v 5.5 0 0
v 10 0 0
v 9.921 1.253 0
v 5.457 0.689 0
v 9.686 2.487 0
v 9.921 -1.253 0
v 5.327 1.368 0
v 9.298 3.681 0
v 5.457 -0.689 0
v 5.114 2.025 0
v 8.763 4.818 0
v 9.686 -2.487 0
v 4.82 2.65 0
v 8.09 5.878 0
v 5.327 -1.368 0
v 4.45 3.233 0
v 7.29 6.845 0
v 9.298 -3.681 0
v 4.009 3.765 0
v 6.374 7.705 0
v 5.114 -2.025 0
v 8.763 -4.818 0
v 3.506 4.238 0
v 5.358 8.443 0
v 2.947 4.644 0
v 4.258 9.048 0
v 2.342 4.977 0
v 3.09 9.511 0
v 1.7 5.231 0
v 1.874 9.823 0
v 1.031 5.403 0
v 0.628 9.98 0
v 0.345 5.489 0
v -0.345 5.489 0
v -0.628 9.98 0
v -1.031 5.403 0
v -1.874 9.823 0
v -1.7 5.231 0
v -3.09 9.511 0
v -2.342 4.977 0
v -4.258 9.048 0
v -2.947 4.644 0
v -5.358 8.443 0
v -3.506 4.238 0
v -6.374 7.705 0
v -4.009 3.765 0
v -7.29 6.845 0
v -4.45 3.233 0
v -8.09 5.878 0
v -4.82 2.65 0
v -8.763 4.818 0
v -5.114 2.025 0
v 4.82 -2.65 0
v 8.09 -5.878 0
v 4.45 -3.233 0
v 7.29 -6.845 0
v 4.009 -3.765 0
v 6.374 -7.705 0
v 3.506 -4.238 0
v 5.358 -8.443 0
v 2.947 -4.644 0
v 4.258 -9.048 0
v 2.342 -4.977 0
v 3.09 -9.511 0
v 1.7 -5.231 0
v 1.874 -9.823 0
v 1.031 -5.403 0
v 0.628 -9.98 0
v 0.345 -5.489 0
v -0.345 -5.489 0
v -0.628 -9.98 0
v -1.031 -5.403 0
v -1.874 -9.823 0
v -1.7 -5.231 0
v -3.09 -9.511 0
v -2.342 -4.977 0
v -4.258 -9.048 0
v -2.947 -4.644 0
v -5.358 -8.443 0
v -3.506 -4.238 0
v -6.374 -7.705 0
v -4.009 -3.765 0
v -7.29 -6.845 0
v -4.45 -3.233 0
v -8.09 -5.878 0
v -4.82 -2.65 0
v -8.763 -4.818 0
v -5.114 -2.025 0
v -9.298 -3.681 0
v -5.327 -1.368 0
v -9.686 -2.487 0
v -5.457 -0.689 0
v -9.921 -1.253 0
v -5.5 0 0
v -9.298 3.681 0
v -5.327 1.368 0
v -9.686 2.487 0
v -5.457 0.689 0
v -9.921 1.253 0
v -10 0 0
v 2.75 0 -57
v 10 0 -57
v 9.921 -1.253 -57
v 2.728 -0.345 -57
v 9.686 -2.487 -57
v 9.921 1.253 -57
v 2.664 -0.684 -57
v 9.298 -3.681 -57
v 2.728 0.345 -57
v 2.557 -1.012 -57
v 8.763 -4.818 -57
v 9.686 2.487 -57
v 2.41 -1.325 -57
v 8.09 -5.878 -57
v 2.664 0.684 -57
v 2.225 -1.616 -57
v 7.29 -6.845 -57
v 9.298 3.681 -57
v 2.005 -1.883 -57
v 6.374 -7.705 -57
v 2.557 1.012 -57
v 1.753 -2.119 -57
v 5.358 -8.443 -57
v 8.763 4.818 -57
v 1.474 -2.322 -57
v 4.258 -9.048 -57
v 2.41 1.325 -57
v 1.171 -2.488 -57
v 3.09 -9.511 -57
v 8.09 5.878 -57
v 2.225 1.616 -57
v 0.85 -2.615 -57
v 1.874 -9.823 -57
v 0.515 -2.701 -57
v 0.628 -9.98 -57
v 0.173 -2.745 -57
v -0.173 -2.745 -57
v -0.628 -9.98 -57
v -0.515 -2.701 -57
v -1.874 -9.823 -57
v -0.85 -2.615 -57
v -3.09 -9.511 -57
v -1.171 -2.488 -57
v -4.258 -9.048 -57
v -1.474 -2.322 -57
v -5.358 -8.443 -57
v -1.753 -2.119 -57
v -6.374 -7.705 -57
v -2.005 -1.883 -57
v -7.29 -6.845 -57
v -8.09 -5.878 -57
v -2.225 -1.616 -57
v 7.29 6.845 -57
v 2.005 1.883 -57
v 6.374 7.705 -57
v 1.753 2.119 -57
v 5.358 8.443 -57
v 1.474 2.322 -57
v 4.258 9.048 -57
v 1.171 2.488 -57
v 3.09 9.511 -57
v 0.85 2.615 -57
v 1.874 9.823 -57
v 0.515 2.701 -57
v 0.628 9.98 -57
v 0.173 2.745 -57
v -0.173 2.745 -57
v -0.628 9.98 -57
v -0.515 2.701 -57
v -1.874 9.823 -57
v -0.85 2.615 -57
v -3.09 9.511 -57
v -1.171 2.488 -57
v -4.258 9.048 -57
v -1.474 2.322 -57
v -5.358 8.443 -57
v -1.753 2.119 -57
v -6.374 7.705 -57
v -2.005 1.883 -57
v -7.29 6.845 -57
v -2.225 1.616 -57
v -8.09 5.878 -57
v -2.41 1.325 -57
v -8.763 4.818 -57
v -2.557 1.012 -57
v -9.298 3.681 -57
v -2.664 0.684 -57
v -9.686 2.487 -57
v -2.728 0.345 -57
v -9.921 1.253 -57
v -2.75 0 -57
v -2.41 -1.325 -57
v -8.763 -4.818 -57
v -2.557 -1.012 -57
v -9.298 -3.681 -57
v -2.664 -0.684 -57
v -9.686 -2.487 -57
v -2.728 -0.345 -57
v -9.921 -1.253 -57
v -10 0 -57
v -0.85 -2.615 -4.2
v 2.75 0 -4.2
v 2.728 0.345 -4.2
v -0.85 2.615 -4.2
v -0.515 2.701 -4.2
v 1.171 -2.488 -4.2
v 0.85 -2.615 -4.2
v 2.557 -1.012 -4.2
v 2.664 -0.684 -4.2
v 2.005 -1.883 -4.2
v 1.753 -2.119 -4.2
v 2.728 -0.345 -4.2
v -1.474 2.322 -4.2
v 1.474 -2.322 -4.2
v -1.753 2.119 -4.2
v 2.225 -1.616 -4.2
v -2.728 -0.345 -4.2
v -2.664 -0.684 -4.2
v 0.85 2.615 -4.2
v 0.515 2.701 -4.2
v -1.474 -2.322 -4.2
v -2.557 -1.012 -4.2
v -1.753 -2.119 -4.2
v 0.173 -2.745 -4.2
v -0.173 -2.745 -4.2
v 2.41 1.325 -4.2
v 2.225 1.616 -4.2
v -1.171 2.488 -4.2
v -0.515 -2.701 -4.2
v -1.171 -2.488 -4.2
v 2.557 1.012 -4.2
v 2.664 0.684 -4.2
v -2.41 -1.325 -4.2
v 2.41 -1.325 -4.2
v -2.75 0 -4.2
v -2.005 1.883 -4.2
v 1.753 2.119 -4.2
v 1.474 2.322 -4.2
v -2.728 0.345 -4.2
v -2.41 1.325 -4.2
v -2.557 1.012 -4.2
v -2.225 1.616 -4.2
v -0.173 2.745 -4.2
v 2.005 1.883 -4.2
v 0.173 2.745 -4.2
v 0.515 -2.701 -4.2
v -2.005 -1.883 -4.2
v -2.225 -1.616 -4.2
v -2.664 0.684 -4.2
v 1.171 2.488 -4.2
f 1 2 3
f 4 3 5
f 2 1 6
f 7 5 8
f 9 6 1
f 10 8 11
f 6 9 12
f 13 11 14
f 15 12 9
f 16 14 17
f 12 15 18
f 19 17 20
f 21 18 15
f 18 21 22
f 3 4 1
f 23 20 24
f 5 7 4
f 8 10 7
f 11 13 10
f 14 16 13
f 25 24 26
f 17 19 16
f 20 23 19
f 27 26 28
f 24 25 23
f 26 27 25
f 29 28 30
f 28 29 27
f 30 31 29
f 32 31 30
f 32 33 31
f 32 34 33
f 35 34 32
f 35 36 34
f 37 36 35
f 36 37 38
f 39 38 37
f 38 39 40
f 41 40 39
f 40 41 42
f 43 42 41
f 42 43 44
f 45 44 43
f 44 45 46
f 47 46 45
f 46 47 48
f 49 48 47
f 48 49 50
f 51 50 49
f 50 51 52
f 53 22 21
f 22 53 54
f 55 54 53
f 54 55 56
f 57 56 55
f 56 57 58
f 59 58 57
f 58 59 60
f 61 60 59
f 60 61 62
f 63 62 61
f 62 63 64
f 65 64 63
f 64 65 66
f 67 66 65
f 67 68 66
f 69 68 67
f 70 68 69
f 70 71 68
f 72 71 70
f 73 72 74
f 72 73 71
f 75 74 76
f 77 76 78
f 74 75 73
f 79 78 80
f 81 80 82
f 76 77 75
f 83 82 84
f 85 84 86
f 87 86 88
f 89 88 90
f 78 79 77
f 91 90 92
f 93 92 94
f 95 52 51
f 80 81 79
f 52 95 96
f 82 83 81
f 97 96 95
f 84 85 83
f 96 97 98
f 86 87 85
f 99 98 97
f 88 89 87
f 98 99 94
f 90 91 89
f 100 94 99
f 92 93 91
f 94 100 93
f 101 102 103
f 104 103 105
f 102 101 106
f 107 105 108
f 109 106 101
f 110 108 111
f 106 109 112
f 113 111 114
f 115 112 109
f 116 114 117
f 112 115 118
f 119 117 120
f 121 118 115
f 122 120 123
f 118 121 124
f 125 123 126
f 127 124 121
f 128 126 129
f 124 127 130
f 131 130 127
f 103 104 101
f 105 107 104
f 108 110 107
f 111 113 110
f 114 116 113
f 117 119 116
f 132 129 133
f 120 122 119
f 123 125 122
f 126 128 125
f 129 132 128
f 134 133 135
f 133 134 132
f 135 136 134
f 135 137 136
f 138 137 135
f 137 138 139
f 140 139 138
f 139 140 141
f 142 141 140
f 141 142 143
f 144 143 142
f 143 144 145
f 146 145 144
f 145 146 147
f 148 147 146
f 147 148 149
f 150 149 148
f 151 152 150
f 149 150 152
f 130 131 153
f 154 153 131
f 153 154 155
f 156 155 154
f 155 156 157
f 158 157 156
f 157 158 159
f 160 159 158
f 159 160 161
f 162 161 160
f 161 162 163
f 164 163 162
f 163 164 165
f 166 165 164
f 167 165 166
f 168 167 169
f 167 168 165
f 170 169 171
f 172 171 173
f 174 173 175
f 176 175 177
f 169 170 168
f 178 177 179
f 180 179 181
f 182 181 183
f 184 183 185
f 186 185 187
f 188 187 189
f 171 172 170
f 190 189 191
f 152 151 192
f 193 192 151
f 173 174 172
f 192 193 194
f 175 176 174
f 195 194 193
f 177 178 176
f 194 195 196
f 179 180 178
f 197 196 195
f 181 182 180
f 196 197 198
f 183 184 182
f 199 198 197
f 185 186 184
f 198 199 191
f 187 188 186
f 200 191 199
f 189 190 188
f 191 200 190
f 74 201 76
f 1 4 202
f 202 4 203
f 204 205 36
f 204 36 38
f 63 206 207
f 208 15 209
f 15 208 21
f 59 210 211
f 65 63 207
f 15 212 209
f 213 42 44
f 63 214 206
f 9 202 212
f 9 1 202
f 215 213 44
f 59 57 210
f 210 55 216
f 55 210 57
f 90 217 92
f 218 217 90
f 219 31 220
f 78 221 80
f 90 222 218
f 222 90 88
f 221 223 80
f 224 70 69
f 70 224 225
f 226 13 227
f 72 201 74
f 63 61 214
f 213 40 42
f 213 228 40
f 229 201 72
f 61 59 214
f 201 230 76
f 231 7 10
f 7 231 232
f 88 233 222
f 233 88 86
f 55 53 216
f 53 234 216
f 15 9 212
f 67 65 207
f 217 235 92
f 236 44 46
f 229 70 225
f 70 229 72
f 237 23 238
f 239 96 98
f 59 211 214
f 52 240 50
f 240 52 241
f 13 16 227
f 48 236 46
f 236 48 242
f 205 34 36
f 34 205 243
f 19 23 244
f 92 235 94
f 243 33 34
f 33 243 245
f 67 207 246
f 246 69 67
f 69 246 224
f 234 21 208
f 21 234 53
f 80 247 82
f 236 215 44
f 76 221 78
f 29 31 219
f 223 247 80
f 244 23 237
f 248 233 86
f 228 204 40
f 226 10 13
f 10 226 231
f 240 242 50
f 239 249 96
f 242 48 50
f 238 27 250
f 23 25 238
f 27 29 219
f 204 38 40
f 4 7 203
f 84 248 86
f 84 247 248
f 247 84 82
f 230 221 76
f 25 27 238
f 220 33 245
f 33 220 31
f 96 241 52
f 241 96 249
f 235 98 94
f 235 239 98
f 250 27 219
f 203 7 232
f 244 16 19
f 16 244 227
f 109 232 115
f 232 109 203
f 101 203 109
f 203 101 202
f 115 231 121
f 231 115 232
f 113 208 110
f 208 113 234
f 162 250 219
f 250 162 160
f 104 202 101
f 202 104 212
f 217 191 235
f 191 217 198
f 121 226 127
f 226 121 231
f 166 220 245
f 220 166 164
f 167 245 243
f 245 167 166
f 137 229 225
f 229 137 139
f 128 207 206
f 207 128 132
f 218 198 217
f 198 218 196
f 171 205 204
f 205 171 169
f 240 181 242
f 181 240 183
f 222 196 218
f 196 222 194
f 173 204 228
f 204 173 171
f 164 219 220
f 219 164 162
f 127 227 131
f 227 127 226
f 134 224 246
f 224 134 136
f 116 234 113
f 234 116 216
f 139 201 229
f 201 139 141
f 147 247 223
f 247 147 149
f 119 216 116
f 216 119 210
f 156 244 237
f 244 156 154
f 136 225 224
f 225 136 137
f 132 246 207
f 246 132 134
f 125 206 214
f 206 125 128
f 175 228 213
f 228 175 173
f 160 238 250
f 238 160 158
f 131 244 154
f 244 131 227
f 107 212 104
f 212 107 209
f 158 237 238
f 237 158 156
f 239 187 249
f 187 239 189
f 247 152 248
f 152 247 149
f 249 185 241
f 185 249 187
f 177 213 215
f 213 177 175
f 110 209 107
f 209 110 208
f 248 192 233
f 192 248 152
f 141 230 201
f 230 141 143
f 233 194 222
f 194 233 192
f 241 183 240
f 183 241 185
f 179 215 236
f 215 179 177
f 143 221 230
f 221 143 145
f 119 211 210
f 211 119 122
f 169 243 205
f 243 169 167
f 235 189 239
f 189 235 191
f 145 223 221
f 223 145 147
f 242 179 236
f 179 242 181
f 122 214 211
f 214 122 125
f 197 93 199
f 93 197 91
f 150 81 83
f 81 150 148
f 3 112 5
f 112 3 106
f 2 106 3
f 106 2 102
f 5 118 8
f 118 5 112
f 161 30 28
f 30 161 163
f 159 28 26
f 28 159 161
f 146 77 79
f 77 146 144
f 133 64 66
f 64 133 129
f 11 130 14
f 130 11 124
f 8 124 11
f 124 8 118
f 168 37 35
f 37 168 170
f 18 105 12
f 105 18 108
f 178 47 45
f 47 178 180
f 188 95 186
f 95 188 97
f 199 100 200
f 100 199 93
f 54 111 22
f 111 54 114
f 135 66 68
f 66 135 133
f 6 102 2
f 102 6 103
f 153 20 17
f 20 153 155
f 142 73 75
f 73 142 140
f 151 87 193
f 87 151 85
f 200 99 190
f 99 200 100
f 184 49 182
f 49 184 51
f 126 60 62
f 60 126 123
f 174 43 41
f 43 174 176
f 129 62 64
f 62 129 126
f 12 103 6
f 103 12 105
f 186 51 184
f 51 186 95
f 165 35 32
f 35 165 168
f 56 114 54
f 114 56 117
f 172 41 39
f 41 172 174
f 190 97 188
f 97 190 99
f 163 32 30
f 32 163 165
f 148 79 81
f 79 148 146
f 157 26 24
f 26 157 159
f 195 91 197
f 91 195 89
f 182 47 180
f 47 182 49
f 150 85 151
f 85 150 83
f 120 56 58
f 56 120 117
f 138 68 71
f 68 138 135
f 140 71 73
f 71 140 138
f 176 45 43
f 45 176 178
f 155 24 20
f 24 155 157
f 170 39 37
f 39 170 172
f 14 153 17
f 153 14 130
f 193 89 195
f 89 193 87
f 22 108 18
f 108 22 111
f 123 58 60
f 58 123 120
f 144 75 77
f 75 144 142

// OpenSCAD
$fn = 50;


difference() {
	union() {
		translate(v = [0, 0, -57.0000000000]) {
			cylinder(h = 57, r = 10.0000000000);
		}
		cylinder(h = 0, r = 16.0000000000);
	}
	union() {
		translate(v = [0, 0, 0]) {
			rotate(a = [0, 0, 0]) {
				difference() {
					union() {
						#translate(v = [0, 0, -57.0000000000]) {
							cylinder(h = 57, r = 2.2500000000);
						}
						#translate(v = [0, 0, -4.2000000000]) {
							cylinder(h = 4.2000000000, r1 = 2.7500000000, r2 = 5.5000000000);
						}
						#translate(v = [0, 0, -57.0000000000]) {
							cylinder(h = 57, r = 2.7500000000);
						}
						#translate(v = [0, 0, -57.0000000000]) {
							cylinder(h = 57, r = 2.2500000000);
						}
					}
					union();
				}
			}
		}
	}
}
